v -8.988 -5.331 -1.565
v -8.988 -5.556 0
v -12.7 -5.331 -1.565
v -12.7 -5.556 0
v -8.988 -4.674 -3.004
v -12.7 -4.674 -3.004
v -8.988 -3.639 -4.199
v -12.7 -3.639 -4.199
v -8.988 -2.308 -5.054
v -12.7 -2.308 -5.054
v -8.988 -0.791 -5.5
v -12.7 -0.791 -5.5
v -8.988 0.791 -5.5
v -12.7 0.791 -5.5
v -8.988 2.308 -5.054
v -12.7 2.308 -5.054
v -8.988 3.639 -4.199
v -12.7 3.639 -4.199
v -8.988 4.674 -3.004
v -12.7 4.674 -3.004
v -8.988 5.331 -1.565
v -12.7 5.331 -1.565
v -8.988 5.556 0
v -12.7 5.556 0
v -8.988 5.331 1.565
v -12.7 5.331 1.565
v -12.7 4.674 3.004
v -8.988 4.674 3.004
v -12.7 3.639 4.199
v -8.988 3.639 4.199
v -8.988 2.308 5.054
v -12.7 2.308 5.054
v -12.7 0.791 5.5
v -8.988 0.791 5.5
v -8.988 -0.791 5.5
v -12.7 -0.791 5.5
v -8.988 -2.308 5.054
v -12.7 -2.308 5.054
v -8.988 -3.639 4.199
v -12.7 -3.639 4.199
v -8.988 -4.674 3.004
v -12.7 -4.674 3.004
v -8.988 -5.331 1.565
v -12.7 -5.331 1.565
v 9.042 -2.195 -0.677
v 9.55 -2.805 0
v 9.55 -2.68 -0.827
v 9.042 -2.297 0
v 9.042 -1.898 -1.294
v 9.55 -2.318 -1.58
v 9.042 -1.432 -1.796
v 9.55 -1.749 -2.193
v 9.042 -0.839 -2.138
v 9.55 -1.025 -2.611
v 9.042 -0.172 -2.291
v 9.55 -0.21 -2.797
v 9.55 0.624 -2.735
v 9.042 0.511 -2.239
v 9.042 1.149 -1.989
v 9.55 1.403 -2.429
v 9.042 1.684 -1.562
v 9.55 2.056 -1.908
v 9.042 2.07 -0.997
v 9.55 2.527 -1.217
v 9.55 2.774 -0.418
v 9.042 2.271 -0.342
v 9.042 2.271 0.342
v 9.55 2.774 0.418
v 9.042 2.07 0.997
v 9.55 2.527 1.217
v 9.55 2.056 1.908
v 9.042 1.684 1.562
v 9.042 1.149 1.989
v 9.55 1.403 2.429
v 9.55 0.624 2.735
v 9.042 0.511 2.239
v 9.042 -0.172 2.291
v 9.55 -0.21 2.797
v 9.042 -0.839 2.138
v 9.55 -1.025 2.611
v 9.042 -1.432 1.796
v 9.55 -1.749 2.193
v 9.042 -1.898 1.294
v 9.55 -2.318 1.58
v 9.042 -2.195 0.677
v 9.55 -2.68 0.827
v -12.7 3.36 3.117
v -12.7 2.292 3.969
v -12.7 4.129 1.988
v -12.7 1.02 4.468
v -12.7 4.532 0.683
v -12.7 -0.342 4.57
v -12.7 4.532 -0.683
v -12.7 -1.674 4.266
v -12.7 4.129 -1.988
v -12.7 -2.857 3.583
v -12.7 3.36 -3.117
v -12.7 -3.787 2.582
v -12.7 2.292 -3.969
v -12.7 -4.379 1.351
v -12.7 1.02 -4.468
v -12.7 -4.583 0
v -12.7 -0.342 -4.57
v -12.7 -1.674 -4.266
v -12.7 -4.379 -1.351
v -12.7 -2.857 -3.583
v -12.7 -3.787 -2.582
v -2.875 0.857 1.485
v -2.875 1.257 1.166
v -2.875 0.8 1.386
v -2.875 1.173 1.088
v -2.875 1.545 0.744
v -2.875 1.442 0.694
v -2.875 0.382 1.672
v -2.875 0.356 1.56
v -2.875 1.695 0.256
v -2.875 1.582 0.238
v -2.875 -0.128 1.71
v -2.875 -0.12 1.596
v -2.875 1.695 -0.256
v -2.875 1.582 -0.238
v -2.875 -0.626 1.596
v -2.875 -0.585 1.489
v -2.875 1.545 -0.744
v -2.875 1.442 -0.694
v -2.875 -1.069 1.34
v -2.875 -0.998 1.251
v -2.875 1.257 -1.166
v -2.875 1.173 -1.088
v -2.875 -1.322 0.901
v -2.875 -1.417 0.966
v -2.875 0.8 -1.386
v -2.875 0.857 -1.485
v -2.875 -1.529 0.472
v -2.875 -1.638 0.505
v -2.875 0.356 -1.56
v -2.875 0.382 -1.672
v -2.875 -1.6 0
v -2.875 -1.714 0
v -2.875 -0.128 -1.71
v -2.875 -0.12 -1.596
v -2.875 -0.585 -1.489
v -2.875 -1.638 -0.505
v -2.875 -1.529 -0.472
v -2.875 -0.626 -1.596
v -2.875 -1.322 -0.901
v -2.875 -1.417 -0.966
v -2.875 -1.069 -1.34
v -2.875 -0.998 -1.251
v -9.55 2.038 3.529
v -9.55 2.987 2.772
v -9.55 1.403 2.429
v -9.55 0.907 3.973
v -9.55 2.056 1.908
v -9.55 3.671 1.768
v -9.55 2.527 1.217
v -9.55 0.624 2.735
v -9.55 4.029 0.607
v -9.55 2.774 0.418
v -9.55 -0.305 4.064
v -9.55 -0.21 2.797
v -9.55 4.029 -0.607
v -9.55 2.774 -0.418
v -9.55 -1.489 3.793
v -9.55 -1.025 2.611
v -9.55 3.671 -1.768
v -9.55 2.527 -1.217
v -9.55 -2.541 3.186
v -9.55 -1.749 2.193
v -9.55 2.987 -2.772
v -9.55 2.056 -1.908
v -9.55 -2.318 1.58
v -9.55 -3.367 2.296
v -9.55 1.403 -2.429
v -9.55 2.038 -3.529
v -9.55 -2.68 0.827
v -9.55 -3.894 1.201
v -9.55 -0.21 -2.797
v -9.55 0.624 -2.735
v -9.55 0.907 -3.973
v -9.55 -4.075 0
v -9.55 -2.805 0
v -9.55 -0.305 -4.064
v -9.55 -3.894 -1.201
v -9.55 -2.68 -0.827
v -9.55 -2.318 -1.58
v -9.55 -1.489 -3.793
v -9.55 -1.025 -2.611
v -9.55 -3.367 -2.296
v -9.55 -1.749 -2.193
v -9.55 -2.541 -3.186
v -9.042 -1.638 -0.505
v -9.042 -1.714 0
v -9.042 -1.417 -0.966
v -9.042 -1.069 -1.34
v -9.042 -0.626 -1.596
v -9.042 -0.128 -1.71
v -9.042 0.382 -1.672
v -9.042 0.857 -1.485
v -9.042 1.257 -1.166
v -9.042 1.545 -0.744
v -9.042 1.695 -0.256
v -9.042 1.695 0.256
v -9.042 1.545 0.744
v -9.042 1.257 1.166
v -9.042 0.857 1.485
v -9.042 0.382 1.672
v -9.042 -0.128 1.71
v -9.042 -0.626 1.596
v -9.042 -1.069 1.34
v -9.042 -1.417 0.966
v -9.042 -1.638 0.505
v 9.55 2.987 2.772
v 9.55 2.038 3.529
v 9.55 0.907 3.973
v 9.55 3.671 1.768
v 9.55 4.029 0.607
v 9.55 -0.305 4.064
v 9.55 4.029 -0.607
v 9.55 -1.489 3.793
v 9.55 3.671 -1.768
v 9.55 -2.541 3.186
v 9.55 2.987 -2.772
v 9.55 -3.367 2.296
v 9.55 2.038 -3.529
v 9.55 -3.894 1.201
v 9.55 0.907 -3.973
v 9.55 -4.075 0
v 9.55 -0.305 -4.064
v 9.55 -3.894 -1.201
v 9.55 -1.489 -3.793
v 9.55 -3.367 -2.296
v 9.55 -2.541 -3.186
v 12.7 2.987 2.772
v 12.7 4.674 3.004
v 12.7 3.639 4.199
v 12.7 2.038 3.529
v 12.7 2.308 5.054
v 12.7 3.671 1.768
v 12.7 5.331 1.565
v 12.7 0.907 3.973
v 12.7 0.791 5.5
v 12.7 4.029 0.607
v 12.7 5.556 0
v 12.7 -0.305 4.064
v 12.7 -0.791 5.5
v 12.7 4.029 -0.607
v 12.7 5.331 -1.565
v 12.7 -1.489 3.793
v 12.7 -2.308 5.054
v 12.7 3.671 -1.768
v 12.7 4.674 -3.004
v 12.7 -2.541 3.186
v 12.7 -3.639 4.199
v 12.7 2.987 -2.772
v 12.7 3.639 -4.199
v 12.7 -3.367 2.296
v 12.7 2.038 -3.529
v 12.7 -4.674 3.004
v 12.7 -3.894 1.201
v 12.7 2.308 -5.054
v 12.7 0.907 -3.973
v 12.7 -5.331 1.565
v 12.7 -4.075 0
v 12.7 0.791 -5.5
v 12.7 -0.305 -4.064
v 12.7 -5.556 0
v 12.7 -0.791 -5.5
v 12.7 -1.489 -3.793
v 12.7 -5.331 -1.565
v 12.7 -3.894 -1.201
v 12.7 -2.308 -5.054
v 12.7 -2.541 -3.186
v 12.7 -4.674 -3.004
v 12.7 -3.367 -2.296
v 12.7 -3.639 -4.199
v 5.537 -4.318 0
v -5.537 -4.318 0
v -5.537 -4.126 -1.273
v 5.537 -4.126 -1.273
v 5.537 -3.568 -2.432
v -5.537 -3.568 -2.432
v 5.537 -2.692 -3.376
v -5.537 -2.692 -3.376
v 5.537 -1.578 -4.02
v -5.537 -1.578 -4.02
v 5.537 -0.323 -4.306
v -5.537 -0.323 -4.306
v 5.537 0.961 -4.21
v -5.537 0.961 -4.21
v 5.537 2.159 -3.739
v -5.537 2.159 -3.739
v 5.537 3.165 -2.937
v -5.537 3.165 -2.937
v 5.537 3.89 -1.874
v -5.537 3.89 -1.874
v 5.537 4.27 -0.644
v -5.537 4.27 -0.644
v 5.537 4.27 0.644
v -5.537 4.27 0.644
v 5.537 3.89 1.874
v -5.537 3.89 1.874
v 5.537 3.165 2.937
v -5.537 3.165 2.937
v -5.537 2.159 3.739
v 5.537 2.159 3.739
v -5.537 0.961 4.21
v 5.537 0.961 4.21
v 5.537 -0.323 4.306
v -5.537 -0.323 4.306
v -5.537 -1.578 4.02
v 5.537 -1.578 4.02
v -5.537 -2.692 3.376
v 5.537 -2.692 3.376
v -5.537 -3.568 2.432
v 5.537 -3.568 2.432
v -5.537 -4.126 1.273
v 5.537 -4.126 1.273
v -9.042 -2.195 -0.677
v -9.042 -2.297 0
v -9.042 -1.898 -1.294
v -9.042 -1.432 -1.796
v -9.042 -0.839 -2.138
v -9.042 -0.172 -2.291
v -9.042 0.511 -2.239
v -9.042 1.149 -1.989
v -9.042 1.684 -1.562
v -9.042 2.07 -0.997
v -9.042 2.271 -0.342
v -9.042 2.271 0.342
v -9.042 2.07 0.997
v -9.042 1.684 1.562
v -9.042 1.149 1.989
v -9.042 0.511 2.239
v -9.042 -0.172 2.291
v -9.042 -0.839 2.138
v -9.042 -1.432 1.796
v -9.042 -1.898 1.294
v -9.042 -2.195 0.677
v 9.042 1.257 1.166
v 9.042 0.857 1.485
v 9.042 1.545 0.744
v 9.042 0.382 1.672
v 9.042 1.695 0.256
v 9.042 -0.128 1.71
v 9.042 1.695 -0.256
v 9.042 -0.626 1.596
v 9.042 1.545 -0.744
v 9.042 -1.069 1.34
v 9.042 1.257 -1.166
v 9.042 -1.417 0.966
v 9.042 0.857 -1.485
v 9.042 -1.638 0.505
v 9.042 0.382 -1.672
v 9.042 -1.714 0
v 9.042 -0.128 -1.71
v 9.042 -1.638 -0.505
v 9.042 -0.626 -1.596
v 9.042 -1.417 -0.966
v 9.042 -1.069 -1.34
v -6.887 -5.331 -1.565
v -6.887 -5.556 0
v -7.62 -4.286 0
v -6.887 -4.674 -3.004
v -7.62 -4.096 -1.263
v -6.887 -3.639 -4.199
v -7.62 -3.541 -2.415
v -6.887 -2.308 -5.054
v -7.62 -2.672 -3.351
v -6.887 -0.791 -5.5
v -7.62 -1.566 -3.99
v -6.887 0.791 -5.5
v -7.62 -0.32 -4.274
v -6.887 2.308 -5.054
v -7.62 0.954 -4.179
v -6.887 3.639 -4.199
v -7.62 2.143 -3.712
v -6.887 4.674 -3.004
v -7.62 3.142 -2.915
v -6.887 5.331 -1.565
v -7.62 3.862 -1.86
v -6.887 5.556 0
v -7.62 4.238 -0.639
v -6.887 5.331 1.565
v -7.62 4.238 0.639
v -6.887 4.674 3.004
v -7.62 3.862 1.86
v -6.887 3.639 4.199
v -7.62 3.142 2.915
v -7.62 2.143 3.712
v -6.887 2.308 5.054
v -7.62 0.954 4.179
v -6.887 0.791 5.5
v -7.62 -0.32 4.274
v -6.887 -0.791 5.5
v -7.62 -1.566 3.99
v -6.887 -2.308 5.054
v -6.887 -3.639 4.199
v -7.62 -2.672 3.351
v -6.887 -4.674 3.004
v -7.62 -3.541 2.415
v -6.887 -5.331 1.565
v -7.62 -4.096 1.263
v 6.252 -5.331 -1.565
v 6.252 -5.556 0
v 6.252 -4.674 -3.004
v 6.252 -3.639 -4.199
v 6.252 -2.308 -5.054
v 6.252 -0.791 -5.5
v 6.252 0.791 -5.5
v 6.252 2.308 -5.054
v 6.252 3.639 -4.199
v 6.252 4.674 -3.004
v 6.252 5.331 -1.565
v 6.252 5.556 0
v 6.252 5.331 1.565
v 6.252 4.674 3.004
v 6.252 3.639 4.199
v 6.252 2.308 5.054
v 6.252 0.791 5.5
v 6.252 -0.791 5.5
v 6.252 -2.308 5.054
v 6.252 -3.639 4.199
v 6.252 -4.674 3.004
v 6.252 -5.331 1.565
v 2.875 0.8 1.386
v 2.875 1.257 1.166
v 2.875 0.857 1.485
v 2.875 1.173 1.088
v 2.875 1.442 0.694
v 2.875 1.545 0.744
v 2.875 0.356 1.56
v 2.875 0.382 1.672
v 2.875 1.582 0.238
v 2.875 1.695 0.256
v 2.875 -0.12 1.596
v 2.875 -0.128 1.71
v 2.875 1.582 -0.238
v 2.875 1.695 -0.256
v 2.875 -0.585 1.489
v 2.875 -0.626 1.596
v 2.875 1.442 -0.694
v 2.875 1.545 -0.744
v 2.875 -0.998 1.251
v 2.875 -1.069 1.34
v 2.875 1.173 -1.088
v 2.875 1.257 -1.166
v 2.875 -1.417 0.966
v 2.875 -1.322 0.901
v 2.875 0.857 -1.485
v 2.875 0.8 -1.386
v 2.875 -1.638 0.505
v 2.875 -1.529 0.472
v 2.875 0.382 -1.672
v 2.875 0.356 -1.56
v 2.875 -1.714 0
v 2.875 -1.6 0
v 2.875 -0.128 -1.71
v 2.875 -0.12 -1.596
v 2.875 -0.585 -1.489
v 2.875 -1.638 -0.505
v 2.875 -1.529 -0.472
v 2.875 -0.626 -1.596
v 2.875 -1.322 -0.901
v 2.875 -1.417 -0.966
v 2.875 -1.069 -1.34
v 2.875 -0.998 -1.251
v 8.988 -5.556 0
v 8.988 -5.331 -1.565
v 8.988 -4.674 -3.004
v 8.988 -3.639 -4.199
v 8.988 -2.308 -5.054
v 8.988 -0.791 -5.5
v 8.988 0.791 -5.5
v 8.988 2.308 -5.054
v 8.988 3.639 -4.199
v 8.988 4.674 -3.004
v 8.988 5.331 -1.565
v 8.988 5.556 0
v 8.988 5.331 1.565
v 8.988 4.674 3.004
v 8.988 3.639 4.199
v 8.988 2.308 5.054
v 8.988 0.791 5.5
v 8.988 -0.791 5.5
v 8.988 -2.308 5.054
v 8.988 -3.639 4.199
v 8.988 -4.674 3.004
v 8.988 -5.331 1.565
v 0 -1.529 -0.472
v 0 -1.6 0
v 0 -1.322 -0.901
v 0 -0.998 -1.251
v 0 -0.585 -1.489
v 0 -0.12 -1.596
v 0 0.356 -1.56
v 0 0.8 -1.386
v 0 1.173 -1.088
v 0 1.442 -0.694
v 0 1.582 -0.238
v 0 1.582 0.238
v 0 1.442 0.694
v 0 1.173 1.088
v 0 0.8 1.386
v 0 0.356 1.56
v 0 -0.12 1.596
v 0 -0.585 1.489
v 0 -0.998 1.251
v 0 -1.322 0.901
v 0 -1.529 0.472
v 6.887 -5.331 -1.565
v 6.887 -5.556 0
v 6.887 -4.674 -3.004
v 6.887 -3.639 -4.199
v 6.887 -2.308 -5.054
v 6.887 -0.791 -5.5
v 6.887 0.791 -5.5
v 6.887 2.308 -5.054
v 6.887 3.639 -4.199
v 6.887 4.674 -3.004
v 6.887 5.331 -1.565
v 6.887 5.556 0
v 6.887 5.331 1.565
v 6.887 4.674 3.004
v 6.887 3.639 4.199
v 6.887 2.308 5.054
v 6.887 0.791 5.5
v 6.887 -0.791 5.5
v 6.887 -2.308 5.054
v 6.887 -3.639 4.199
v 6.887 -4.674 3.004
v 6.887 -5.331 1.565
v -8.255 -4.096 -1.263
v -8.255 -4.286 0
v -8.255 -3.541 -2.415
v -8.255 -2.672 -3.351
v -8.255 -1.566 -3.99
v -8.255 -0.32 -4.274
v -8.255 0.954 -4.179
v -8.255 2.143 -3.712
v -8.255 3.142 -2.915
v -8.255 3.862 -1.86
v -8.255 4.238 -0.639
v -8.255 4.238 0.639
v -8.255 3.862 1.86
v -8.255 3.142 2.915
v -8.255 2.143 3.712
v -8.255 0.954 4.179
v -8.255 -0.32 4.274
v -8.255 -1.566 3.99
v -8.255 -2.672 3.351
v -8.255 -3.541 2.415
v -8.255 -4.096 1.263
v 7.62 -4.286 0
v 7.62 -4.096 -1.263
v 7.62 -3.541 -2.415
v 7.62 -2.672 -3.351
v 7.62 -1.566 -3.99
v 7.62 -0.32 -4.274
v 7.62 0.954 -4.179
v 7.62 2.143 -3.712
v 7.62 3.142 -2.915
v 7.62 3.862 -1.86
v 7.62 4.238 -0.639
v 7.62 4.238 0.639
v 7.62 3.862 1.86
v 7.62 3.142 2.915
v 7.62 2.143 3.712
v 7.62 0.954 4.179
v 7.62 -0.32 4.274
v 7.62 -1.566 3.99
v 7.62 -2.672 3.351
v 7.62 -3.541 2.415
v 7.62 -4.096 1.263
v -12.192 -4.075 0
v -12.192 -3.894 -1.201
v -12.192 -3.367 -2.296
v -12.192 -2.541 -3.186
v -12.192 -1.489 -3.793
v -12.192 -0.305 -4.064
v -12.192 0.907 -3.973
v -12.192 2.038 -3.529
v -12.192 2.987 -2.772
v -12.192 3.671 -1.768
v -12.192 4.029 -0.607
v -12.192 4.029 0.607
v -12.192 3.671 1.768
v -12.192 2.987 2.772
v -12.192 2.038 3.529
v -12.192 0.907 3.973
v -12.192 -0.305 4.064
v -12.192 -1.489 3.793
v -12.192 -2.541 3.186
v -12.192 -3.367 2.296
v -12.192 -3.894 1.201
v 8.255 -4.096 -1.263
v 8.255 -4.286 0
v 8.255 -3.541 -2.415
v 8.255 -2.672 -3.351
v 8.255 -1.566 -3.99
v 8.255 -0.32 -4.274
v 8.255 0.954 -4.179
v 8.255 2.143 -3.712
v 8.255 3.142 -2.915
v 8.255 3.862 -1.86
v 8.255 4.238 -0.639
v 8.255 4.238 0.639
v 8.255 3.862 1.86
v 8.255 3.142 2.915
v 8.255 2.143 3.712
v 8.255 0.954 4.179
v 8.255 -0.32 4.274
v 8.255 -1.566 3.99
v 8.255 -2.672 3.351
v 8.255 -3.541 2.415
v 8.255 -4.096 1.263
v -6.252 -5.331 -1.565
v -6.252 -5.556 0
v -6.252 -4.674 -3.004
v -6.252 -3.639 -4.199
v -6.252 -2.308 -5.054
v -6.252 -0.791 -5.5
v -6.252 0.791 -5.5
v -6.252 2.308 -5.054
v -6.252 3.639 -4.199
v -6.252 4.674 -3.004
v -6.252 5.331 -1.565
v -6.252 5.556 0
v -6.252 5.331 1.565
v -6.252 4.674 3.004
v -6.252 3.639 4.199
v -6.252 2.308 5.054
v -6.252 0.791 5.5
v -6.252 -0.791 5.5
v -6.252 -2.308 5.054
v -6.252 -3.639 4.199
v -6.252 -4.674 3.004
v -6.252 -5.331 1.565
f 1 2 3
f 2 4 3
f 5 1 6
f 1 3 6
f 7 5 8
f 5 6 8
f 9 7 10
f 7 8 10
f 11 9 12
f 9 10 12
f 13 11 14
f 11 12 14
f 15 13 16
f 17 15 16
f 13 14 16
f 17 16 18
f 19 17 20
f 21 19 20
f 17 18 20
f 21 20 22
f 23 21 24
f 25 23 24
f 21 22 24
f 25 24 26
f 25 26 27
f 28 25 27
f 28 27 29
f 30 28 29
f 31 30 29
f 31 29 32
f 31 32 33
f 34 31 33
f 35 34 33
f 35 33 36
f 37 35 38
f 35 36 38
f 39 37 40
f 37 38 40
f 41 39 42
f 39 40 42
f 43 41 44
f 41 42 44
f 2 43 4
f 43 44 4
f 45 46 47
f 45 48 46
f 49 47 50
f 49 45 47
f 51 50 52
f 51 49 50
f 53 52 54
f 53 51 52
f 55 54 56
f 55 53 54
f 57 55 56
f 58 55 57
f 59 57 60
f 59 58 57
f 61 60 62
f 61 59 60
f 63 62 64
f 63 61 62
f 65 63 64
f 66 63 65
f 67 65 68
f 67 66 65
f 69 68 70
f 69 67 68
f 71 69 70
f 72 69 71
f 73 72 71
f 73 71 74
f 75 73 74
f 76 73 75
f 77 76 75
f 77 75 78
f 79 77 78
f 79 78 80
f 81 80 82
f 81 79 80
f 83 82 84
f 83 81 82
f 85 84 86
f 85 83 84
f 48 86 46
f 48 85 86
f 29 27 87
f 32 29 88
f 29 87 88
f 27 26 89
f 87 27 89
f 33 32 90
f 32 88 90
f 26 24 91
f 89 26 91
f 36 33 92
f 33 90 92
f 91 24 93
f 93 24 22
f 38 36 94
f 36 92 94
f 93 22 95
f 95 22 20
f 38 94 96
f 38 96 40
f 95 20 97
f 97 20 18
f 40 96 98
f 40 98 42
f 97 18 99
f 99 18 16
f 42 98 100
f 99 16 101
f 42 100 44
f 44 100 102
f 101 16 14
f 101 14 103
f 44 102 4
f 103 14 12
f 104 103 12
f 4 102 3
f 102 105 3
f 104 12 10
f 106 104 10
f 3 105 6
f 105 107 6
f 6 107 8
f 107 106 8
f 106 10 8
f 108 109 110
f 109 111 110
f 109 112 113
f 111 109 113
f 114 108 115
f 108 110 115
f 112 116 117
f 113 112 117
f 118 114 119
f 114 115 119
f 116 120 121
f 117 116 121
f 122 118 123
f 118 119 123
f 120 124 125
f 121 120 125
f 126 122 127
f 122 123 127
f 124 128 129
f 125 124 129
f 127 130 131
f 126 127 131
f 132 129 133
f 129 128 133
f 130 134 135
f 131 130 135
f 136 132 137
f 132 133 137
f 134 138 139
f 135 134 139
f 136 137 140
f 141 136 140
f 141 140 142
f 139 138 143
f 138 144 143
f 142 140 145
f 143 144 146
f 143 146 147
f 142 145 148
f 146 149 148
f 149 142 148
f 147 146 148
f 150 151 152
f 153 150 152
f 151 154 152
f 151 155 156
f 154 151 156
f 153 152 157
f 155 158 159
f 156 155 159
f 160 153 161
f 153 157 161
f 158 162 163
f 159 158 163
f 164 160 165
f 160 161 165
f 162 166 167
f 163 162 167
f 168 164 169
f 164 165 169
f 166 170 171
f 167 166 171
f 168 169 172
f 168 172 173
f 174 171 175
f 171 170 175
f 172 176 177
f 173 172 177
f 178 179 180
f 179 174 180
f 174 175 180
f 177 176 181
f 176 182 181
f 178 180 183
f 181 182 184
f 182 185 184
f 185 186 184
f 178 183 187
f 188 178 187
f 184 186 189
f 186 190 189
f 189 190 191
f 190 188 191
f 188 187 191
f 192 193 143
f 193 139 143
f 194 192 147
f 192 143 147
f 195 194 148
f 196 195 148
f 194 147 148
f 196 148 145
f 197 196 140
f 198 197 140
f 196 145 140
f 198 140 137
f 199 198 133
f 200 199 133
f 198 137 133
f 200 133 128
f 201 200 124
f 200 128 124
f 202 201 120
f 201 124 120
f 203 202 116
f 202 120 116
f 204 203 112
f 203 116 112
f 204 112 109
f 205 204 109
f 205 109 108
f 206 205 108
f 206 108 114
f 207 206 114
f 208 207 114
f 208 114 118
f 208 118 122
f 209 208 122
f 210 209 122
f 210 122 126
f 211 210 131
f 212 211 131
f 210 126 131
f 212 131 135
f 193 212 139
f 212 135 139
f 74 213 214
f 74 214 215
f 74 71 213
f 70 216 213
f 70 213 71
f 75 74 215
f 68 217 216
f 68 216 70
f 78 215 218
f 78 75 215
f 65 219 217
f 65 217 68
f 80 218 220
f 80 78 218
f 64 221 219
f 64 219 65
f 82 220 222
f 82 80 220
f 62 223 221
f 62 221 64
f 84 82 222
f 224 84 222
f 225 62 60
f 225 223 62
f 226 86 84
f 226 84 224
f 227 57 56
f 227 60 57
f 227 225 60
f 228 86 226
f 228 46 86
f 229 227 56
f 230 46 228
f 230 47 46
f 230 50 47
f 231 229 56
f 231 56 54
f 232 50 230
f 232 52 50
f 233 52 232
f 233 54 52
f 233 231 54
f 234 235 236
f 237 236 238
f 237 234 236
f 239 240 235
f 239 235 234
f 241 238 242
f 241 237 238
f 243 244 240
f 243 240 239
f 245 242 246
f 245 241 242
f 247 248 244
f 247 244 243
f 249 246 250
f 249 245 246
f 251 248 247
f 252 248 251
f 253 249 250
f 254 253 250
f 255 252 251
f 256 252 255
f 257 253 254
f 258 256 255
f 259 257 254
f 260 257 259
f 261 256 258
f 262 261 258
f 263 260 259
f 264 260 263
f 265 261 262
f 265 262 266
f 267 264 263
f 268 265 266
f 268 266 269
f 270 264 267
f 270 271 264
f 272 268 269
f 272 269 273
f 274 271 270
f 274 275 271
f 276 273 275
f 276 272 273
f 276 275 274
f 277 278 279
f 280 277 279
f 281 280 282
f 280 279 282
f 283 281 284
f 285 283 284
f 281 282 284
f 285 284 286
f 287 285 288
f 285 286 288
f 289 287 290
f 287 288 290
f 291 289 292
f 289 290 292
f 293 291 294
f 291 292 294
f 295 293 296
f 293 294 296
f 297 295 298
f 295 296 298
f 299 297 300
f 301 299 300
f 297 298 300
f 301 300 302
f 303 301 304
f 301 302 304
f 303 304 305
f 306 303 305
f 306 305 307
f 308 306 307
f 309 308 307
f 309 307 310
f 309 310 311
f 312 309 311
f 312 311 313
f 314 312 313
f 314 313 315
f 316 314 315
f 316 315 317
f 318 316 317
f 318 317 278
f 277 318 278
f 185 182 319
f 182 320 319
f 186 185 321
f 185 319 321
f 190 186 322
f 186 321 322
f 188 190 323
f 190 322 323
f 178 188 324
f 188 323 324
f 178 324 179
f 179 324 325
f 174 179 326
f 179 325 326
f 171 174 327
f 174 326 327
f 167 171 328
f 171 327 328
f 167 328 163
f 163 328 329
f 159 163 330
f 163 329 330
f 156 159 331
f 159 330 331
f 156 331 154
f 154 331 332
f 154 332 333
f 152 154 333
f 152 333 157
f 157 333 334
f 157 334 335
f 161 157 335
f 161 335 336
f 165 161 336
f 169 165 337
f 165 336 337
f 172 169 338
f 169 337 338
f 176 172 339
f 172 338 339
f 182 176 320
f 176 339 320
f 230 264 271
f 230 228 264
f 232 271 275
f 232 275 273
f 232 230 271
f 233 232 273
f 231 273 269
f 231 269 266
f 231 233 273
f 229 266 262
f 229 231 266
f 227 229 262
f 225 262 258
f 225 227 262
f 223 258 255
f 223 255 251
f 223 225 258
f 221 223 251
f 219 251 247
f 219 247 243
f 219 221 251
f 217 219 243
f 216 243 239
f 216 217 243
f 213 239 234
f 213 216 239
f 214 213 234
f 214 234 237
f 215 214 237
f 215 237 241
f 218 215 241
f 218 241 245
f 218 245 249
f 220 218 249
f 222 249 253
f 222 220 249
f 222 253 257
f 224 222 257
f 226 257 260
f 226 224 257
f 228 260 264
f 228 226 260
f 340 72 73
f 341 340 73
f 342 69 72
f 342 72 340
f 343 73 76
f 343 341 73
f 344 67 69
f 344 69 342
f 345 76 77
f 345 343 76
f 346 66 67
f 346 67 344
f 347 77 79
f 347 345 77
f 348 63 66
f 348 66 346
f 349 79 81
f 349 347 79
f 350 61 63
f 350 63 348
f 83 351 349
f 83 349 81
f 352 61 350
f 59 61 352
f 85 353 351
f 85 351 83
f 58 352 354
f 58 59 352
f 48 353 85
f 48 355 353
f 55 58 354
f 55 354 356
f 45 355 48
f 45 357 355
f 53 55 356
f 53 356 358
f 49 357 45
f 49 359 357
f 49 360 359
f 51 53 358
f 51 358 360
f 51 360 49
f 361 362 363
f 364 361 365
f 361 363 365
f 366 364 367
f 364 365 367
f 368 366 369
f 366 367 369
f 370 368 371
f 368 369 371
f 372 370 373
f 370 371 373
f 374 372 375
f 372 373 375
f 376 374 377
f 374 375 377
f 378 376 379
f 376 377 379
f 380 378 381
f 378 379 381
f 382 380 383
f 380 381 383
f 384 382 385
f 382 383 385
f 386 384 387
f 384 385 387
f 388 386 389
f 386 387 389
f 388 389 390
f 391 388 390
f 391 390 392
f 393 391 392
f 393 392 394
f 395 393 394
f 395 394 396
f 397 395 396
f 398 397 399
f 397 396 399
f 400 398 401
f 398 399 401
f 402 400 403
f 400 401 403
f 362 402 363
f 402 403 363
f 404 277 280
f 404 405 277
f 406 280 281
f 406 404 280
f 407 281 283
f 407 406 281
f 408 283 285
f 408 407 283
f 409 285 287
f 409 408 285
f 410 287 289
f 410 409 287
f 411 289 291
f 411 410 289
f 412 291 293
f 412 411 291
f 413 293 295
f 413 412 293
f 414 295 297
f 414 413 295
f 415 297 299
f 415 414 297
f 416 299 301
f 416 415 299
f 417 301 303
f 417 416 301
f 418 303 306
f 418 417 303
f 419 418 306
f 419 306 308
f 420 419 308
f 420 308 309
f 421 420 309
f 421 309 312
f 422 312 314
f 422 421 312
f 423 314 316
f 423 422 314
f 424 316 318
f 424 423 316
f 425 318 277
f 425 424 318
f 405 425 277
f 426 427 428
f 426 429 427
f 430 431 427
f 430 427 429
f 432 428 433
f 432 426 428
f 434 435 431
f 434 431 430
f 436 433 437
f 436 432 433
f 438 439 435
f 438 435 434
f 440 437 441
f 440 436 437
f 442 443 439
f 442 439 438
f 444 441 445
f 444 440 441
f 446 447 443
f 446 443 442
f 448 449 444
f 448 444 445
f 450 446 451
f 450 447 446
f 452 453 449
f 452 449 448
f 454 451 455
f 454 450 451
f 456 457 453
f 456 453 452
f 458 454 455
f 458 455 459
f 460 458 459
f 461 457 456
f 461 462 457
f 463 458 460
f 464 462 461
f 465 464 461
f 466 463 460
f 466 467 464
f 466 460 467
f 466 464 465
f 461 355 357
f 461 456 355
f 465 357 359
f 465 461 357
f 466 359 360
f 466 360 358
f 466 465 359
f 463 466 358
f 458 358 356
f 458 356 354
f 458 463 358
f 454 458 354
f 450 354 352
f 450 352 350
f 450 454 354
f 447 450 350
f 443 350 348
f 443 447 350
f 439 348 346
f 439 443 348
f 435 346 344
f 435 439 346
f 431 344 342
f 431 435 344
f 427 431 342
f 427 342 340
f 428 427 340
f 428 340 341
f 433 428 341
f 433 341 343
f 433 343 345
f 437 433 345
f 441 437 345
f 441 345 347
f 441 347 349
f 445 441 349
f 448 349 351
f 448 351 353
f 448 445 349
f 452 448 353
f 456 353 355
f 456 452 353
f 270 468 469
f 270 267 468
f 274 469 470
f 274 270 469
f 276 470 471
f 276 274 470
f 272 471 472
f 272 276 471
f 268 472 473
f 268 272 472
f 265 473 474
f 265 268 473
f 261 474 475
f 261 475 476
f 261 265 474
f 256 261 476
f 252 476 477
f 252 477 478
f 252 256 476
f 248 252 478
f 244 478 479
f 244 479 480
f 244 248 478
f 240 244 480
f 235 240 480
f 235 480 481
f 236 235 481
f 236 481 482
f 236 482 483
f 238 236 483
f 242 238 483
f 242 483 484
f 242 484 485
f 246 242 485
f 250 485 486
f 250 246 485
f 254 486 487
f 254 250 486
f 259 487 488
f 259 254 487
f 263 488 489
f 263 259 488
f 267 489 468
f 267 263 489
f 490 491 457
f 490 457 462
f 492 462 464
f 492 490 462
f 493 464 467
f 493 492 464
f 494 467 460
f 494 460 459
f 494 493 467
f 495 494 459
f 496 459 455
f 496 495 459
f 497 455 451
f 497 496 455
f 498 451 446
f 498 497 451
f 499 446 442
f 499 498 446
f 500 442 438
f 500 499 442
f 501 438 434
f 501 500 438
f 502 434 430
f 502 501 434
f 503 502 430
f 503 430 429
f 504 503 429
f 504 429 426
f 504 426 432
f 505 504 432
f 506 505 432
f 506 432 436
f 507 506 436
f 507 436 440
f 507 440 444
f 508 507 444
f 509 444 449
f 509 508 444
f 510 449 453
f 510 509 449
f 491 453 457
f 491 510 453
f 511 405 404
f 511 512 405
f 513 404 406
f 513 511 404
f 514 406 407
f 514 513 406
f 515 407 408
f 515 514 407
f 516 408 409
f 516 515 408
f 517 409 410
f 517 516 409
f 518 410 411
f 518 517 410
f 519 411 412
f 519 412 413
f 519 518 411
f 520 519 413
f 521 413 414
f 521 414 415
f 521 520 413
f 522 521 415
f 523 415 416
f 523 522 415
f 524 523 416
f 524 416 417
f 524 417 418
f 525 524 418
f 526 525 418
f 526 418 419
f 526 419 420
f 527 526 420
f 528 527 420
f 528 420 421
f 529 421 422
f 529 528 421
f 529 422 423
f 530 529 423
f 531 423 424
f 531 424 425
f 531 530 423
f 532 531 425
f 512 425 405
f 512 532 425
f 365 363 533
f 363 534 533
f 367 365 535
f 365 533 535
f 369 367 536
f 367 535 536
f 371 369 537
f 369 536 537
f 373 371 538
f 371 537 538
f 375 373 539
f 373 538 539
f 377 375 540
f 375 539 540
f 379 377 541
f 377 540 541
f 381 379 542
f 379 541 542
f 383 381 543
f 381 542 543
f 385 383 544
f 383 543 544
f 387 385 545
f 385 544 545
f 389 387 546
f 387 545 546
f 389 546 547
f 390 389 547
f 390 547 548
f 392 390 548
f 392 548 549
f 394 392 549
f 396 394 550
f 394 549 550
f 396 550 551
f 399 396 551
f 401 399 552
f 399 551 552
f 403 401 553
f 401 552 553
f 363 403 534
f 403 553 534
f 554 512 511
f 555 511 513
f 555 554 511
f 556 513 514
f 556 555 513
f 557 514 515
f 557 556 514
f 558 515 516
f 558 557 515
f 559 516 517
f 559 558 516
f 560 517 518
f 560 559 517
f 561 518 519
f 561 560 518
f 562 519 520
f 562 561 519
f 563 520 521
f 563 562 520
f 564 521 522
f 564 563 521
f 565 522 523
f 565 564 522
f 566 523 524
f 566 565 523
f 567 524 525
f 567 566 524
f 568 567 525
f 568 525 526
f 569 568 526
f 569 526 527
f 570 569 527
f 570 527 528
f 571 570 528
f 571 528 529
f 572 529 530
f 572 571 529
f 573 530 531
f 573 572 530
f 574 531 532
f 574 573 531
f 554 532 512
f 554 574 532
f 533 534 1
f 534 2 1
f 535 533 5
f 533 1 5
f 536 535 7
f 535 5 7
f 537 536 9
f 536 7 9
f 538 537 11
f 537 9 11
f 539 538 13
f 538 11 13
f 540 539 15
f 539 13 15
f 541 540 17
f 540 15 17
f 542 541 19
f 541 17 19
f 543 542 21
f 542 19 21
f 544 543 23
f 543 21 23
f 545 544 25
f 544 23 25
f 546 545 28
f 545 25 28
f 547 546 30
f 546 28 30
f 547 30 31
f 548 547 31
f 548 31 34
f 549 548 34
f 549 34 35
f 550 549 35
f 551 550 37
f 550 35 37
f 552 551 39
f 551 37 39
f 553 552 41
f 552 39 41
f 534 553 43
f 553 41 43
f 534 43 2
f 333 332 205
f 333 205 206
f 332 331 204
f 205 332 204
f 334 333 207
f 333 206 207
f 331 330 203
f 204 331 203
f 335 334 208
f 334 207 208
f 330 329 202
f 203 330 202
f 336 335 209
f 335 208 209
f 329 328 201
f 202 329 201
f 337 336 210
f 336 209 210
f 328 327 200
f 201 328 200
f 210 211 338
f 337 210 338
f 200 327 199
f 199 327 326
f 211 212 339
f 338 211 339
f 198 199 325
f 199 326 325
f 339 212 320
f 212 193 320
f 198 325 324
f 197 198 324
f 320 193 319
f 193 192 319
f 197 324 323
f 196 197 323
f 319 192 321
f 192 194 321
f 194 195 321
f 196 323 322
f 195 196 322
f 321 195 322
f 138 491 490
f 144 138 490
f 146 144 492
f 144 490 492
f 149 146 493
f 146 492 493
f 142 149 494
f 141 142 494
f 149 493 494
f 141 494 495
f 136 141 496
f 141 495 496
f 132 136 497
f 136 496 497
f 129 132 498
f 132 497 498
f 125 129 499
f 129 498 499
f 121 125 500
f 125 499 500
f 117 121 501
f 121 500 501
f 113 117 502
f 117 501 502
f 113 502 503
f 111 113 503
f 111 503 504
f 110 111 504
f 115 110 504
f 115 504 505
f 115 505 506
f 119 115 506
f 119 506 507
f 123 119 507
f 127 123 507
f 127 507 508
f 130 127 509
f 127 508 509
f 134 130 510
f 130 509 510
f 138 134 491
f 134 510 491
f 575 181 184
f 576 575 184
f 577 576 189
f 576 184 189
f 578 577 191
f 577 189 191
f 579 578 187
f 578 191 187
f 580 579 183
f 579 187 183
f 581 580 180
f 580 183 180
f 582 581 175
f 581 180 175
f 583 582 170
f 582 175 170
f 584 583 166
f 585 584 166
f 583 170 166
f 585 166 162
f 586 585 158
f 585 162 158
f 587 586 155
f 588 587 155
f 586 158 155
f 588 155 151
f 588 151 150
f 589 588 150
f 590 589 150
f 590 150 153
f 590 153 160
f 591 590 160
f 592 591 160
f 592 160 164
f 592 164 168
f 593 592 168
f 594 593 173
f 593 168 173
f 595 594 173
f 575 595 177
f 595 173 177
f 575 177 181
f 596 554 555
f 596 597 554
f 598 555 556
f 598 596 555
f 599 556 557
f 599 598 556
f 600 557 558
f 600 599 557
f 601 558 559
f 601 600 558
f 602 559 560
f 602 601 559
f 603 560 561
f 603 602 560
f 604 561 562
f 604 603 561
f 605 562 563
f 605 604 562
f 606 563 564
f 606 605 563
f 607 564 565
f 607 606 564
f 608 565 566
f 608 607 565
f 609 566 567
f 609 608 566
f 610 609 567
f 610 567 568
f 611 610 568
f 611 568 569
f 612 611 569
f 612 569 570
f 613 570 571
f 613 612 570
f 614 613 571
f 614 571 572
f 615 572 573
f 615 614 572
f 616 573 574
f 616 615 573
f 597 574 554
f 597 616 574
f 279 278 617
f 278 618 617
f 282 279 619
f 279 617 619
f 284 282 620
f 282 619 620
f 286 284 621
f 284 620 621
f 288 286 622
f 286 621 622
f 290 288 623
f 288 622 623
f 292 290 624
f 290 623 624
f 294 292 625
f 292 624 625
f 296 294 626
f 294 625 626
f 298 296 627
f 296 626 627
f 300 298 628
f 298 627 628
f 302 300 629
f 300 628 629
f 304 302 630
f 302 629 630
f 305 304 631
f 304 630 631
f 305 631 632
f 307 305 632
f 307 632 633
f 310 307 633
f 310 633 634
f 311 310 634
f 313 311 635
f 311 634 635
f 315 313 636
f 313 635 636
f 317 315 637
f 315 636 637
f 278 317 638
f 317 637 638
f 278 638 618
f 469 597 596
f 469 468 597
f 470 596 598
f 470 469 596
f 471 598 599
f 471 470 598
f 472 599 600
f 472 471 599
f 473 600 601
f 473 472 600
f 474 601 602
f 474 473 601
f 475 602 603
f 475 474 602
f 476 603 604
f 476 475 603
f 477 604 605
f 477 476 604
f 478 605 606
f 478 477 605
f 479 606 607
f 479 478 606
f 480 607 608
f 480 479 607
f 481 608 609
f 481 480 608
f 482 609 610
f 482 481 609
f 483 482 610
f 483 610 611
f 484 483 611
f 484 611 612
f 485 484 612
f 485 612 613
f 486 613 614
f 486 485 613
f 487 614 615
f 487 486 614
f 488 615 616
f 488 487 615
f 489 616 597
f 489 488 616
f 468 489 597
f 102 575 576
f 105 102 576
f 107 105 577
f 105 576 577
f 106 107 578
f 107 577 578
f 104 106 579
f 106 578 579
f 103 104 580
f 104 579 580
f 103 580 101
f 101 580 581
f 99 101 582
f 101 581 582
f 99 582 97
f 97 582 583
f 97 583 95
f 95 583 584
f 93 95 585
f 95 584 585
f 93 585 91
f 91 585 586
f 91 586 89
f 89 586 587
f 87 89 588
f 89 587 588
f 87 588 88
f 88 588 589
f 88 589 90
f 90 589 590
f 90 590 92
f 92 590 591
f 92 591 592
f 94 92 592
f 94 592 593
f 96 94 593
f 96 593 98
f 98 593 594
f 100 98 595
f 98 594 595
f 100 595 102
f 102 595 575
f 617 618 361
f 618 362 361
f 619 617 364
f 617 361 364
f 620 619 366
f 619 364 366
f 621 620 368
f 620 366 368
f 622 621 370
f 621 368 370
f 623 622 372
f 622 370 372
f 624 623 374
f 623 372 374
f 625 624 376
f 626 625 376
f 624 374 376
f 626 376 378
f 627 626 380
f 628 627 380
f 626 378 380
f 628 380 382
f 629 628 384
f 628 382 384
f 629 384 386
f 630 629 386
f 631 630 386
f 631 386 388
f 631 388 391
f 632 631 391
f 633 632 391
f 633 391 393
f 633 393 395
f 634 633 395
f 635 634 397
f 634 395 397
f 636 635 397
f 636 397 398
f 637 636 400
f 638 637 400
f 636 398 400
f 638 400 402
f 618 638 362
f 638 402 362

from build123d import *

# Parameters (mm, degrees)
CHAMFER1_SIZE = 0.508


with BuildPart() as part:
    # Sketch2 → Revolve1 (revolve)
    with BuildSketch(Plane.XY, mode=Mode.PRIVATE) as revolve1_sk:
        Polygon((-8.988234842, 5.55625), (-12.7, 5.55625), (-12.7, 4.075), (-9.55, 4.075), (-9.55, 2.805), (-9.042, 2.297), (-9.042, 1.7145), (-2.875, 1.7145), (-2.875, 1.6), (0, 1.6), (0, 4.318), (-5.536861187, 4.318), (-6.251765158, 5.55625), (-6.886765158, 5.55625), (-7.62, 4.28625), (-8.255, 4.28625), align=None)
    revolve(revolve1_sk.sketch.rotate(Axis((-12.7, 0, 0), (1, 0, 0)), 180), axis=Axis((-12.7, 0, 0), (1, 0, 0)))

    # Mirror1: part across plane


with BuildPart() as part_1:
    add(part.part)
    add(part.part.mirror(Plane(origin=(0, 0, 0), x_dir=(0, 0, 1), z_dir=(1, 0, 0))))

    # Chamfer1
    chamfer1_edges = [part_1.edges().sort_by_distance(p)[0] for p in [
        (-12.7, 4.075, 0),
    ]]
    chamfer(chamfer1_edges, length=CHAMFER1_SIZE)


solid = part_1.part
